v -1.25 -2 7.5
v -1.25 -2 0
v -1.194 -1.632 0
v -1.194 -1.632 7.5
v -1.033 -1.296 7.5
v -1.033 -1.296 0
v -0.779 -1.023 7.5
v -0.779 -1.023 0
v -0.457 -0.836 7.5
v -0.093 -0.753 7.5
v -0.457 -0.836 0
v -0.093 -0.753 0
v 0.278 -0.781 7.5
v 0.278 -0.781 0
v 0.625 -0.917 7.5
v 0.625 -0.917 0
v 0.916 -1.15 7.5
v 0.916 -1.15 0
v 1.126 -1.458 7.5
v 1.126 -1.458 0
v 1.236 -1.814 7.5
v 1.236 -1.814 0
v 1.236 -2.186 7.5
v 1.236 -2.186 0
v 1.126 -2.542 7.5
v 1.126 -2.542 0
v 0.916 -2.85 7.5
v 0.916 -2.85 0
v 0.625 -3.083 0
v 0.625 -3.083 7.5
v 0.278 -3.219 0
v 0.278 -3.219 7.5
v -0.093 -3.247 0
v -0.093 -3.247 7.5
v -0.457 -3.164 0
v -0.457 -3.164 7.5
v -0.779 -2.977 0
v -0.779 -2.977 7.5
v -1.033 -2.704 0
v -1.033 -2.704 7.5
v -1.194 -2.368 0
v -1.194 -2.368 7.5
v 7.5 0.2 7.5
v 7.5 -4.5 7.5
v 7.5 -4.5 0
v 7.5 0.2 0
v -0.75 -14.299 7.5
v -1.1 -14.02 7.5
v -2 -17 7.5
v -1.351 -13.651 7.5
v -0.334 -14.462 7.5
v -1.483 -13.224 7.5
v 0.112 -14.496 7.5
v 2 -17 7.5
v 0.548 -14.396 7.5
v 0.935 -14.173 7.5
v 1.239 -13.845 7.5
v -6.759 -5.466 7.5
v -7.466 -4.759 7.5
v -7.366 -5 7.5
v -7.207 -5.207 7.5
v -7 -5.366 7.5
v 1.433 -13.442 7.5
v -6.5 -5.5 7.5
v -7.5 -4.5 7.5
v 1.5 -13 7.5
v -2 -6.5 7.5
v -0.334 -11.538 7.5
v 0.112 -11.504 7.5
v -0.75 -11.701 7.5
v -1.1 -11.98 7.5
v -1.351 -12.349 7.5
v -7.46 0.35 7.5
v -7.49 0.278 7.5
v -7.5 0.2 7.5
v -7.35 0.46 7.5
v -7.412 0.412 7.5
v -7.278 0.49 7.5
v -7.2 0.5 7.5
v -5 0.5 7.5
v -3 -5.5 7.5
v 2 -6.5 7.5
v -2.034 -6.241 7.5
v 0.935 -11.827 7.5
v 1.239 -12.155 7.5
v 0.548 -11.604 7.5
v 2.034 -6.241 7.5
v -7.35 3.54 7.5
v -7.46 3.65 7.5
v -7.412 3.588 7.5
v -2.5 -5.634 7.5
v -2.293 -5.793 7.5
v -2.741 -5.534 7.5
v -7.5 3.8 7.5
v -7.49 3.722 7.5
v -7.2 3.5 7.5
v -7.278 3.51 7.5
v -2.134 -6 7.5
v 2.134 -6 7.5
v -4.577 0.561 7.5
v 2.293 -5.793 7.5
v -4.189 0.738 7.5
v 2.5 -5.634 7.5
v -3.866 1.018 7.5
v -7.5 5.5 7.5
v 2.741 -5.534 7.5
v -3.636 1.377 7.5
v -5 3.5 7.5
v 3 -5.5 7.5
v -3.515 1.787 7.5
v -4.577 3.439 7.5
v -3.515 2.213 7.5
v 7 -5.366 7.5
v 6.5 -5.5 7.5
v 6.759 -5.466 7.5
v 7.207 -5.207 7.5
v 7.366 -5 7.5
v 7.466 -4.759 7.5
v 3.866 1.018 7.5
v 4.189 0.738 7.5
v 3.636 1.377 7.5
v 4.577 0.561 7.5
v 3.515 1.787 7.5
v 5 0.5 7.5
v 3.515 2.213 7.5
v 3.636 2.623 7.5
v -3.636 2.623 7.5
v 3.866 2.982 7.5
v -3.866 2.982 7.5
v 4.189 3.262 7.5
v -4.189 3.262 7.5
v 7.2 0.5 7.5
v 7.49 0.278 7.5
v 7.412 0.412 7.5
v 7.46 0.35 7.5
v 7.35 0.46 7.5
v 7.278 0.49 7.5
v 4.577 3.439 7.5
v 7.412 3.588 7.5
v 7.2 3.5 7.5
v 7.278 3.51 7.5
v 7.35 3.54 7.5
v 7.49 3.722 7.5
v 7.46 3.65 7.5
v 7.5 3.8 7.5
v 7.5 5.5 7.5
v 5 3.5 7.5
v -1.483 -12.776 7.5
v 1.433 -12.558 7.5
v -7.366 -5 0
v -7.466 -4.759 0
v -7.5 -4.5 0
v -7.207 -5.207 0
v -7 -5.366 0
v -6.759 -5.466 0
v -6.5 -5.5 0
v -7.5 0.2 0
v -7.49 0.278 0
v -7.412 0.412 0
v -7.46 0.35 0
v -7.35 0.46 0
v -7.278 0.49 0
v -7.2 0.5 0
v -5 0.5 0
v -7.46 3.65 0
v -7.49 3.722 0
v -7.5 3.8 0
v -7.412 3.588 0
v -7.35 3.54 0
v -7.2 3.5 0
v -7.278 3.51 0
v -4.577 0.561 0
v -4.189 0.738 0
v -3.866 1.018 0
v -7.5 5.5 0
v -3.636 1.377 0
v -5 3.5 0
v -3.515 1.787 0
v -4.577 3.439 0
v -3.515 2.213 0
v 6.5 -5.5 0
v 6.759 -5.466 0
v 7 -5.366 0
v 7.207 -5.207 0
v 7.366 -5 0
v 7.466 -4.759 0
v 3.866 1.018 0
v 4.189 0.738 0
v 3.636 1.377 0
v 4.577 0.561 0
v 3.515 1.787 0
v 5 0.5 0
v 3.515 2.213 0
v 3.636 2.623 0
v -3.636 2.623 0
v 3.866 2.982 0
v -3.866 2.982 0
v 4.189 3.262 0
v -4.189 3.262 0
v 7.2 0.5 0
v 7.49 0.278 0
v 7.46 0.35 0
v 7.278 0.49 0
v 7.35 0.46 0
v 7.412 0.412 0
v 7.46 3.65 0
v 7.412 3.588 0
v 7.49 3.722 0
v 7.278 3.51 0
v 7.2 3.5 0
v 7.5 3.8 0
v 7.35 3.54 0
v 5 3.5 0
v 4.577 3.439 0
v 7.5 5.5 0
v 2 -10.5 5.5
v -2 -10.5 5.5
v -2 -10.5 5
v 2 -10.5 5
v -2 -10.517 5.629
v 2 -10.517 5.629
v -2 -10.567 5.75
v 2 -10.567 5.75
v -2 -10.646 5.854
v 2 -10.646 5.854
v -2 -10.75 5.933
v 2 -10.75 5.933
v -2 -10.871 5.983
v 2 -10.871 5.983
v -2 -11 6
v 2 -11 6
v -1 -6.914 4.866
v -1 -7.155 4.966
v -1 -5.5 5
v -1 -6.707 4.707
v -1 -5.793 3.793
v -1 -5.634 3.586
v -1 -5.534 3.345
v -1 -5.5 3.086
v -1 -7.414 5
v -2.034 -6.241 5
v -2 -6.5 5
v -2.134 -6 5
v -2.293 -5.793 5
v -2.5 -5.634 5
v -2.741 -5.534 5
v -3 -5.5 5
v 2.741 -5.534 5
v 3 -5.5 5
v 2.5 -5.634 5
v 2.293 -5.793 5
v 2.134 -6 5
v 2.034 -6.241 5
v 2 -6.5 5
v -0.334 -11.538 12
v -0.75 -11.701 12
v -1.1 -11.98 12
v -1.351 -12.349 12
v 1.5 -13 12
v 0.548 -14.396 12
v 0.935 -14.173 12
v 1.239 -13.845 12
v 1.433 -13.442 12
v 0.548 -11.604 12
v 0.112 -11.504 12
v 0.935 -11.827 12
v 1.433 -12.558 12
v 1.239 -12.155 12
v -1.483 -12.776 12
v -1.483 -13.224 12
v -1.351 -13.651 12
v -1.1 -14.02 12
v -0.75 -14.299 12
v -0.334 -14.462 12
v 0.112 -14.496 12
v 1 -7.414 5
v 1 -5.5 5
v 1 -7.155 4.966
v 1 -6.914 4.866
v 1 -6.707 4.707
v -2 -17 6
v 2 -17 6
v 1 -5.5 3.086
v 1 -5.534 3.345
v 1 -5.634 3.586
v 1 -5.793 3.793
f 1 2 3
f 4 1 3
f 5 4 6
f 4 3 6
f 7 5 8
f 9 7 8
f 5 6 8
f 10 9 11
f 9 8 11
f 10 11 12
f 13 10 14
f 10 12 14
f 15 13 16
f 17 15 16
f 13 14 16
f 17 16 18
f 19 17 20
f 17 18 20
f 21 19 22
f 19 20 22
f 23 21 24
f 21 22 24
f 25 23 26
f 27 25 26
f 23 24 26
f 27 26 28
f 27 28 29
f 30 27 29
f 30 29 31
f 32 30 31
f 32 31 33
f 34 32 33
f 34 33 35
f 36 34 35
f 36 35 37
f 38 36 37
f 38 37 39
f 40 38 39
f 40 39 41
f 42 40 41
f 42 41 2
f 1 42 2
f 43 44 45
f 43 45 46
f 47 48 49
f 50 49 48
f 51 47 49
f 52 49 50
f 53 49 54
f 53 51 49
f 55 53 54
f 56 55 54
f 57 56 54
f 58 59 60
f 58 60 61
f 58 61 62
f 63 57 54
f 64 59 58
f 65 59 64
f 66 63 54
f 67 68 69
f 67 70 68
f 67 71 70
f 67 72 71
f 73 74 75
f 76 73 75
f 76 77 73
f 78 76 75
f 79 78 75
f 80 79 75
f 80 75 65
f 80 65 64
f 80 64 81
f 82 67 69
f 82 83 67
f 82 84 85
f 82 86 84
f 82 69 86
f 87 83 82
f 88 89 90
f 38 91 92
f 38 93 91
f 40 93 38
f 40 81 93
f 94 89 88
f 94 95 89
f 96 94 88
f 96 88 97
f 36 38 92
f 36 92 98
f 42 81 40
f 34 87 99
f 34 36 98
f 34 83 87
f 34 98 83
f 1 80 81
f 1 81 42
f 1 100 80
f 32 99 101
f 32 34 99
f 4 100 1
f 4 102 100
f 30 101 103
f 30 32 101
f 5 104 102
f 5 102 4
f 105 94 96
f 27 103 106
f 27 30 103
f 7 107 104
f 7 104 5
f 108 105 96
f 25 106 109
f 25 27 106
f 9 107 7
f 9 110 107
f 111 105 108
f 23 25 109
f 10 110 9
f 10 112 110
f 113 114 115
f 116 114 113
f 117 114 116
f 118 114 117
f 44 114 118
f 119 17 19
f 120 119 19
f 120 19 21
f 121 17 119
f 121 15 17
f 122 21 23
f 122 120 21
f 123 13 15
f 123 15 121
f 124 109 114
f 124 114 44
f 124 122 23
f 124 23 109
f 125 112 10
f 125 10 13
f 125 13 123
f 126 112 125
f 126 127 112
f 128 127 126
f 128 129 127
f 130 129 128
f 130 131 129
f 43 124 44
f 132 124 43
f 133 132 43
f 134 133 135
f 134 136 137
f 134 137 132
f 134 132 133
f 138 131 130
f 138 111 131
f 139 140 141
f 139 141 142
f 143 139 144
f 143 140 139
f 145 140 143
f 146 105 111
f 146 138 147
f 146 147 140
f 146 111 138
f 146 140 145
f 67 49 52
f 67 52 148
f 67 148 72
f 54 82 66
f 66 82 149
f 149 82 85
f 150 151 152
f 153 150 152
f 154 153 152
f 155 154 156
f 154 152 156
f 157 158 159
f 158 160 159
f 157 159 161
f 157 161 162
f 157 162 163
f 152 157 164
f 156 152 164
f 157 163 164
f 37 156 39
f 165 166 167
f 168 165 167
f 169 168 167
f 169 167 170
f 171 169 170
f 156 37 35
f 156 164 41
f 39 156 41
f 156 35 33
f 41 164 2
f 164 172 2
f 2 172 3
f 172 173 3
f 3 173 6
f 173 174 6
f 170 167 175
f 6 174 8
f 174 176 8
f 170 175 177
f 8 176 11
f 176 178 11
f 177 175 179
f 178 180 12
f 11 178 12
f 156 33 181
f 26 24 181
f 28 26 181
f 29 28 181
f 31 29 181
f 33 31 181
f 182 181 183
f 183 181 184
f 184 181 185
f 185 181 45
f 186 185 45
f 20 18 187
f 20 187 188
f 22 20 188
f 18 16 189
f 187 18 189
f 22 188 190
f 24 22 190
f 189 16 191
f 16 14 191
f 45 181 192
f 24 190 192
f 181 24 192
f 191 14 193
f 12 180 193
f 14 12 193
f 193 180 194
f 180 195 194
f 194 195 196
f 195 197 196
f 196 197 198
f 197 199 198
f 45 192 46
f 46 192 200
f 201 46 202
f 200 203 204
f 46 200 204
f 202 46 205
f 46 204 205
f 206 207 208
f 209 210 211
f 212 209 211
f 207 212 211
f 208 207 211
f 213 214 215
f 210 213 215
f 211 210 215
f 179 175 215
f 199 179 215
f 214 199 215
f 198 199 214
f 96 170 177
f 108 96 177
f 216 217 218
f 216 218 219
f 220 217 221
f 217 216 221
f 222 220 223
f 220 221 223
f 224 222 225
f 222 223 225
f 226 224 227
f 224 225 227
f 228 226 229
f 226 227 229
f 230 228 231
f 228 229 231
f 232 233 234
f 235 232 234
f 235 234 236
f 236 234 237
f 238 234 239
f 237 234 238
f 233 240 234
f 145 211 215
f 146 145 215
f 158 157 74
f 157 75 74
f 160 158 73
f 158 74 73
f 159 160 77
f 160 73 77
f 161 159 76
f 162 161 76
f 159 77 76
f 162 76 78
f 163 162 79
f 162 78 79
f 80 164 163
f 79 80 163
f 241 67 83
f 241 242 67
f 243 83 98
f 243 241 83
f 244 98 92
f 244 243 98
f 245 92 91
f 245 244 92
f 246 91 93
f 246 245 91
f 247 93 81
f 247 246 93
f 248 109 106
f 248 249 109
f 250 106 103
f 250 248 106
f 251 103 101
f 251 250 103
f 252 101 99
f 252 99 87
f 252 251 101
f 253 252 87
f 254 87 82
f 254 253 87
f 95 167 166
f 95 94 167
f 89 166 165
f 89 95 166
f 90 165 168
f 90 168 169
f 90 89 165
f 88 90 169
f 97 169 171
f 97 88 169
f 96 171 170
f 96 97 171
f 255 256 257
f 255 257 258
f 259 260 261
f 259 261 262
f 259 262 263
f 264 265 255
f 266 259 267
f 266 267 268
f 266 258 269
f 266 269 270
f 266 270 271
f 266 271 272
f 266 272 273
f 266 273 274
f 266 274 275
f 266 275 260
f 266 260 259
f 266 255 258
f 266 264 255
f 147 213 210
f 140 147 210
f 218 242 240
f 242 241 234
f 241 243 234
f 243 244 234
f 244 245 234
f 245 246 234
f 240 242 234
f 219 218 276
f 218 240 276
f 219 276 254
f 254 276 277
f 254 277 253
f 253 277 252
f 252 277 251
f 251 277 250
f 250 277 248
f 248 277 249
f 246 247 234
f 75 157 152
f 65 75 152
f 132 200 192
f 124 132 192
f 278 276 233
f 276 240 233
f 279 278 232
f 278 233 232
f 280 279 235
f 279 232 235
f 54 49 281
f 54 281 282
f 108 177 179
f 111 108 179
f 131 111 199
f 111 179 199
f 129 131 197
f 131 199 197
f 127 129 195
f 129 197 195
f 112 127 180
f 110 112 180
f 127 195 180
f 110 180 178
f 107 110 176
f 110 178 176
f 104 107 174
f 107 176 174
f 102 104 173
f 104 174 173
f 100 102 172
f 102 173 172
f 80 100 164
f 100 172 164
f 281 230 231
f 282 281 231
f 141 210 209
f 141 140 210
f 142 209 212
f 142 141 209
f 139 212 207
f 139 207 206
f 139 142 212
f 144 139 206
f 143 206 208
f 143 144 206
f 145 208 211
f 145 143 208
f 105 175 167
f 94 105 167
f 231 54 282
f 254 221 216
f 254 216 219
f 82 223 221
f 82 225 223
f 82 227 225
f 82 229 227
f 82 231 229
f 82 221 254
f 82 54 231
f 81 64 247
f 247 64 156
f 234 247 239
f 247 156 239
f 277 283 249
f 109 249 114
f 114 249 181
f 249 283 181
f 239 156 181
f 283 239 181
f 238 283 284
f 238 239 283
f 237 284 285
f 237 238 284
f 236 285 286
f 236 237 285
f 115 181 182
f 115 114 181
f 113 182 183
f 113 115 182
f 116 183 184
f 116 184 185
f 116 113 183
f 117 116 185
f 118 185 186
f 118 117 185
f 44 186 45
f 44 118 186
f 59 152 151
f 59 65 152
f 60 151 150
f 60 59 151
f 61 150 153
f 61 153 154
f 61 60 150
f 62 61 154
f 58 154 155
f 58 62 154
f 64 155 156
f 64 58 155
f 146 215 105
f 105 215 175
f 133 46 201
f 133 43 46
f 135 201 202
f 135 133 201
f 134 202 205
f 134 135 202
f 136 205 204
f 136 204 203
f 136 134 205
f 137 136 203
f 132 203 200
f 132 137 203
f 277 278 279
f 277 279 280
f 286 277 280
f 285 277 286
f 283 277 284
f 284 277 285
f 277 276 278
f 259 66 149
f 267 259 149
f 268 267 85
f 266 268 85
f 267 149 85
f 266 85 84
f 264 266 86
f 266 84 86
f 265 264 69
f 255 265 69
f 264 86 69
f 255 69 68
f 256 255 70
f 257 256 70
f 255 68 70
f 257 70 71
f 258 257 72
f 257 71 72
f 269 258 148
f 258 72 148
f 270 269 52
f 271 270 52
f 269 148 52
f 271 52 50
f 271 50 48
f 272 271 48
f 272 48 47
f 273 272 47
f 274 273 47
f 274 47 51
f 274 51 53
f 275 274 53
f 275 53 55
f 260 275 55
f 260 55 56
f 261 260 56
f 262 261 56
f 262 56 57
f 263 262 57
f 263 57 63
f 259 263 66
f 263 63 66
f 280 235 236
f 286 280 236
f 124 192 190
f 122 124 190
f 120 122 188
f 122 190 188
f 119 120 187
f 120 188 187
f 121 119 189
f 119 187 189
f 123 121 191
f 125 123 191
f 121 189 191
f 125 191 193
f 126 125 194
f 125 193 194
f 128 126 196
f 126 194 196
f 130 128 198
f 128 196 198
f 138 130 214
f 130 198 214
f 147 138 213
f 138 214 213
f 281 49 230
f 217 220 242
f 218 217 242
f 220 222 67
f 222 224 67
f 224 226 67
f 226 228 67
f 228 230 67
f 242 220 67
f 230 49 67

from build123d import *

# Parameters (mm, degrees)
EXTRUDE_1_DEPTH      = 7.5
FILLET_1_R           = 0.3
FILLET_2_R           = 1
HOLE_WIZARD_M3_1_D   = 2.5
SKETCH_4_W           = 4
SKETCH_4_H           = 5
EXTRUDE_2_DEPTH      = 2.5
SKETCH_5_W           = 4
SKETCH_5_H           = 6.5
EXTRUDE_3_DEPTH      = 1.5
FILLET_3_R           = 0.5
EXTRUDE_4_DEPTH      = 1
EXTRUDE_4_DEPTH_BACK = 1
FILLET_4_R           = 1
SKETCH_7_R           = 1.5
EXTRUDE_5_DEPTH      = 4.5


with BuildPart() as part:
    # 草图1 → 凸台-拉伸1 (new body)
    with BuildSketch(Plane.XY):
        with BuildLine():
            Line((-7.5, 0.5), (-7.5, -5.5))
            Line((-7.5, -5.5), (7.5, -5.5))
            Line((7.5, -5.5), (7.5, 0.5))
            Line((7.5, 0.5), (5, 0.5))
            ThreePointArc((5, 0.5), (3.5, 2), (5, 3.5))
            Line((5, 3.5), (7.5, 3.5))
            Line((7.5, 3.5), (7.5, 5.5))
            Line((7.5, 5.5), (-7.5, 5.5))
            Line((-7.5, 5.5), (-7.5, 3.5))
            Line((-7.5, 3.5), (-5, 3.5))
            ThreePointArc((-5, 3.5), (-3.5, 2), (-5, 0.5))
            Line((-5, 0.5), (-7.5, 0.5))
        make_face()
    extrude(amount=EXTRUDE_1_DEPTH)

    # 圆角1
    fillet_1_edges = [part.edges().sort_by_distance(p)[0] for p in [
        (7.5, 0.5, 3.75),
        (-7.5, 0.5, 3.75),
        (-7.5, 3.5, 3.75),
        (7.5, 3.5, 3.75),
    ]]
    fillet(fillet_1_edges, radius=FILLET_1_R)

    # 圆角2
    fillet_2_edges = [part.edges().sort_by_distance(p)[0] for p in [
        (7.5, -5.5, 3.75),
        (-7.5, -5.5, 3.75),
    ]]
    fillet(fillet_2_edges, radius=FILLET_2_R)

    # M3 螺纹孔1 (through all)
    with Locations(Plane(origin=(0, -2, 7.5), x_dir=(1, 0, 0), z_dir=(0, 0, 1))):
        with Locations((0, 0)):
            Hole(HOLE_WIZARD_M3_1_D / 2)

    # 草图4 → 凸台-拉伸2 (add)
    with BuildSketch(Plane.XY.offset(7.5)):
        with Locations((0, -8)):
            Rectangle(SKETCH_4_W, SKETCH_4_H)
    extrude(amount=-EXTRUDE_2_DEPTH)

    # 草图5 → 凸台-拉伸3 (add)
    with BuildSketch(Plane.XY.offset(7.5)):
        with Locations((0, -13.75)):
            Rectangle(SKETCH_5_W, SKETCH_5_H)
    extrude(amount=-EXTRUDE_3_DEPTH)

    # 圆角3
    fillet_3_edges = [part.edges().sort_by_distance(p)[0] for p in [
        (0, -10.5, 6),
    ]]
    fillet(fillet_3_edges, radius=FILLET_3_R)

    # 草图6 → 凸台-拉伸4 (add, two sides: drawn at the far end of the back side and taken through both)
    with BuildSketch(Plane.ZY.offset(-EXTRUDE_4_DEPTH_BACK)):
        Polygon((5, -7), (3.5, -5.5), (5, -5.5), align=None)
    extrude(amount=EXTRUDE_4_DEPTH + EXTRUDE_4_DEPTH_BACK)

    # 圆角4
    fillet_4_edges = [part.edges().sort_by_distance(p)[0] for p in [
        (0, -7, 5),
        (0, -5.5, 3.5),
        (-2, -5.5, 6.25),
        (2, -5.5, 6.25),
    ]]
    fillet(fillet_4_edges, radius=FILLET_4_R)

    # 草图7 → 凸台-拉伸5 (add)
    with BuildSketch(Plane.XY.offset(7.5)):
        with Locations((0, -13)):
            Circle(SKETCH_7_R)
    extrude(amount=EXTRUDE_5_DEPTH)


solid = part.part
